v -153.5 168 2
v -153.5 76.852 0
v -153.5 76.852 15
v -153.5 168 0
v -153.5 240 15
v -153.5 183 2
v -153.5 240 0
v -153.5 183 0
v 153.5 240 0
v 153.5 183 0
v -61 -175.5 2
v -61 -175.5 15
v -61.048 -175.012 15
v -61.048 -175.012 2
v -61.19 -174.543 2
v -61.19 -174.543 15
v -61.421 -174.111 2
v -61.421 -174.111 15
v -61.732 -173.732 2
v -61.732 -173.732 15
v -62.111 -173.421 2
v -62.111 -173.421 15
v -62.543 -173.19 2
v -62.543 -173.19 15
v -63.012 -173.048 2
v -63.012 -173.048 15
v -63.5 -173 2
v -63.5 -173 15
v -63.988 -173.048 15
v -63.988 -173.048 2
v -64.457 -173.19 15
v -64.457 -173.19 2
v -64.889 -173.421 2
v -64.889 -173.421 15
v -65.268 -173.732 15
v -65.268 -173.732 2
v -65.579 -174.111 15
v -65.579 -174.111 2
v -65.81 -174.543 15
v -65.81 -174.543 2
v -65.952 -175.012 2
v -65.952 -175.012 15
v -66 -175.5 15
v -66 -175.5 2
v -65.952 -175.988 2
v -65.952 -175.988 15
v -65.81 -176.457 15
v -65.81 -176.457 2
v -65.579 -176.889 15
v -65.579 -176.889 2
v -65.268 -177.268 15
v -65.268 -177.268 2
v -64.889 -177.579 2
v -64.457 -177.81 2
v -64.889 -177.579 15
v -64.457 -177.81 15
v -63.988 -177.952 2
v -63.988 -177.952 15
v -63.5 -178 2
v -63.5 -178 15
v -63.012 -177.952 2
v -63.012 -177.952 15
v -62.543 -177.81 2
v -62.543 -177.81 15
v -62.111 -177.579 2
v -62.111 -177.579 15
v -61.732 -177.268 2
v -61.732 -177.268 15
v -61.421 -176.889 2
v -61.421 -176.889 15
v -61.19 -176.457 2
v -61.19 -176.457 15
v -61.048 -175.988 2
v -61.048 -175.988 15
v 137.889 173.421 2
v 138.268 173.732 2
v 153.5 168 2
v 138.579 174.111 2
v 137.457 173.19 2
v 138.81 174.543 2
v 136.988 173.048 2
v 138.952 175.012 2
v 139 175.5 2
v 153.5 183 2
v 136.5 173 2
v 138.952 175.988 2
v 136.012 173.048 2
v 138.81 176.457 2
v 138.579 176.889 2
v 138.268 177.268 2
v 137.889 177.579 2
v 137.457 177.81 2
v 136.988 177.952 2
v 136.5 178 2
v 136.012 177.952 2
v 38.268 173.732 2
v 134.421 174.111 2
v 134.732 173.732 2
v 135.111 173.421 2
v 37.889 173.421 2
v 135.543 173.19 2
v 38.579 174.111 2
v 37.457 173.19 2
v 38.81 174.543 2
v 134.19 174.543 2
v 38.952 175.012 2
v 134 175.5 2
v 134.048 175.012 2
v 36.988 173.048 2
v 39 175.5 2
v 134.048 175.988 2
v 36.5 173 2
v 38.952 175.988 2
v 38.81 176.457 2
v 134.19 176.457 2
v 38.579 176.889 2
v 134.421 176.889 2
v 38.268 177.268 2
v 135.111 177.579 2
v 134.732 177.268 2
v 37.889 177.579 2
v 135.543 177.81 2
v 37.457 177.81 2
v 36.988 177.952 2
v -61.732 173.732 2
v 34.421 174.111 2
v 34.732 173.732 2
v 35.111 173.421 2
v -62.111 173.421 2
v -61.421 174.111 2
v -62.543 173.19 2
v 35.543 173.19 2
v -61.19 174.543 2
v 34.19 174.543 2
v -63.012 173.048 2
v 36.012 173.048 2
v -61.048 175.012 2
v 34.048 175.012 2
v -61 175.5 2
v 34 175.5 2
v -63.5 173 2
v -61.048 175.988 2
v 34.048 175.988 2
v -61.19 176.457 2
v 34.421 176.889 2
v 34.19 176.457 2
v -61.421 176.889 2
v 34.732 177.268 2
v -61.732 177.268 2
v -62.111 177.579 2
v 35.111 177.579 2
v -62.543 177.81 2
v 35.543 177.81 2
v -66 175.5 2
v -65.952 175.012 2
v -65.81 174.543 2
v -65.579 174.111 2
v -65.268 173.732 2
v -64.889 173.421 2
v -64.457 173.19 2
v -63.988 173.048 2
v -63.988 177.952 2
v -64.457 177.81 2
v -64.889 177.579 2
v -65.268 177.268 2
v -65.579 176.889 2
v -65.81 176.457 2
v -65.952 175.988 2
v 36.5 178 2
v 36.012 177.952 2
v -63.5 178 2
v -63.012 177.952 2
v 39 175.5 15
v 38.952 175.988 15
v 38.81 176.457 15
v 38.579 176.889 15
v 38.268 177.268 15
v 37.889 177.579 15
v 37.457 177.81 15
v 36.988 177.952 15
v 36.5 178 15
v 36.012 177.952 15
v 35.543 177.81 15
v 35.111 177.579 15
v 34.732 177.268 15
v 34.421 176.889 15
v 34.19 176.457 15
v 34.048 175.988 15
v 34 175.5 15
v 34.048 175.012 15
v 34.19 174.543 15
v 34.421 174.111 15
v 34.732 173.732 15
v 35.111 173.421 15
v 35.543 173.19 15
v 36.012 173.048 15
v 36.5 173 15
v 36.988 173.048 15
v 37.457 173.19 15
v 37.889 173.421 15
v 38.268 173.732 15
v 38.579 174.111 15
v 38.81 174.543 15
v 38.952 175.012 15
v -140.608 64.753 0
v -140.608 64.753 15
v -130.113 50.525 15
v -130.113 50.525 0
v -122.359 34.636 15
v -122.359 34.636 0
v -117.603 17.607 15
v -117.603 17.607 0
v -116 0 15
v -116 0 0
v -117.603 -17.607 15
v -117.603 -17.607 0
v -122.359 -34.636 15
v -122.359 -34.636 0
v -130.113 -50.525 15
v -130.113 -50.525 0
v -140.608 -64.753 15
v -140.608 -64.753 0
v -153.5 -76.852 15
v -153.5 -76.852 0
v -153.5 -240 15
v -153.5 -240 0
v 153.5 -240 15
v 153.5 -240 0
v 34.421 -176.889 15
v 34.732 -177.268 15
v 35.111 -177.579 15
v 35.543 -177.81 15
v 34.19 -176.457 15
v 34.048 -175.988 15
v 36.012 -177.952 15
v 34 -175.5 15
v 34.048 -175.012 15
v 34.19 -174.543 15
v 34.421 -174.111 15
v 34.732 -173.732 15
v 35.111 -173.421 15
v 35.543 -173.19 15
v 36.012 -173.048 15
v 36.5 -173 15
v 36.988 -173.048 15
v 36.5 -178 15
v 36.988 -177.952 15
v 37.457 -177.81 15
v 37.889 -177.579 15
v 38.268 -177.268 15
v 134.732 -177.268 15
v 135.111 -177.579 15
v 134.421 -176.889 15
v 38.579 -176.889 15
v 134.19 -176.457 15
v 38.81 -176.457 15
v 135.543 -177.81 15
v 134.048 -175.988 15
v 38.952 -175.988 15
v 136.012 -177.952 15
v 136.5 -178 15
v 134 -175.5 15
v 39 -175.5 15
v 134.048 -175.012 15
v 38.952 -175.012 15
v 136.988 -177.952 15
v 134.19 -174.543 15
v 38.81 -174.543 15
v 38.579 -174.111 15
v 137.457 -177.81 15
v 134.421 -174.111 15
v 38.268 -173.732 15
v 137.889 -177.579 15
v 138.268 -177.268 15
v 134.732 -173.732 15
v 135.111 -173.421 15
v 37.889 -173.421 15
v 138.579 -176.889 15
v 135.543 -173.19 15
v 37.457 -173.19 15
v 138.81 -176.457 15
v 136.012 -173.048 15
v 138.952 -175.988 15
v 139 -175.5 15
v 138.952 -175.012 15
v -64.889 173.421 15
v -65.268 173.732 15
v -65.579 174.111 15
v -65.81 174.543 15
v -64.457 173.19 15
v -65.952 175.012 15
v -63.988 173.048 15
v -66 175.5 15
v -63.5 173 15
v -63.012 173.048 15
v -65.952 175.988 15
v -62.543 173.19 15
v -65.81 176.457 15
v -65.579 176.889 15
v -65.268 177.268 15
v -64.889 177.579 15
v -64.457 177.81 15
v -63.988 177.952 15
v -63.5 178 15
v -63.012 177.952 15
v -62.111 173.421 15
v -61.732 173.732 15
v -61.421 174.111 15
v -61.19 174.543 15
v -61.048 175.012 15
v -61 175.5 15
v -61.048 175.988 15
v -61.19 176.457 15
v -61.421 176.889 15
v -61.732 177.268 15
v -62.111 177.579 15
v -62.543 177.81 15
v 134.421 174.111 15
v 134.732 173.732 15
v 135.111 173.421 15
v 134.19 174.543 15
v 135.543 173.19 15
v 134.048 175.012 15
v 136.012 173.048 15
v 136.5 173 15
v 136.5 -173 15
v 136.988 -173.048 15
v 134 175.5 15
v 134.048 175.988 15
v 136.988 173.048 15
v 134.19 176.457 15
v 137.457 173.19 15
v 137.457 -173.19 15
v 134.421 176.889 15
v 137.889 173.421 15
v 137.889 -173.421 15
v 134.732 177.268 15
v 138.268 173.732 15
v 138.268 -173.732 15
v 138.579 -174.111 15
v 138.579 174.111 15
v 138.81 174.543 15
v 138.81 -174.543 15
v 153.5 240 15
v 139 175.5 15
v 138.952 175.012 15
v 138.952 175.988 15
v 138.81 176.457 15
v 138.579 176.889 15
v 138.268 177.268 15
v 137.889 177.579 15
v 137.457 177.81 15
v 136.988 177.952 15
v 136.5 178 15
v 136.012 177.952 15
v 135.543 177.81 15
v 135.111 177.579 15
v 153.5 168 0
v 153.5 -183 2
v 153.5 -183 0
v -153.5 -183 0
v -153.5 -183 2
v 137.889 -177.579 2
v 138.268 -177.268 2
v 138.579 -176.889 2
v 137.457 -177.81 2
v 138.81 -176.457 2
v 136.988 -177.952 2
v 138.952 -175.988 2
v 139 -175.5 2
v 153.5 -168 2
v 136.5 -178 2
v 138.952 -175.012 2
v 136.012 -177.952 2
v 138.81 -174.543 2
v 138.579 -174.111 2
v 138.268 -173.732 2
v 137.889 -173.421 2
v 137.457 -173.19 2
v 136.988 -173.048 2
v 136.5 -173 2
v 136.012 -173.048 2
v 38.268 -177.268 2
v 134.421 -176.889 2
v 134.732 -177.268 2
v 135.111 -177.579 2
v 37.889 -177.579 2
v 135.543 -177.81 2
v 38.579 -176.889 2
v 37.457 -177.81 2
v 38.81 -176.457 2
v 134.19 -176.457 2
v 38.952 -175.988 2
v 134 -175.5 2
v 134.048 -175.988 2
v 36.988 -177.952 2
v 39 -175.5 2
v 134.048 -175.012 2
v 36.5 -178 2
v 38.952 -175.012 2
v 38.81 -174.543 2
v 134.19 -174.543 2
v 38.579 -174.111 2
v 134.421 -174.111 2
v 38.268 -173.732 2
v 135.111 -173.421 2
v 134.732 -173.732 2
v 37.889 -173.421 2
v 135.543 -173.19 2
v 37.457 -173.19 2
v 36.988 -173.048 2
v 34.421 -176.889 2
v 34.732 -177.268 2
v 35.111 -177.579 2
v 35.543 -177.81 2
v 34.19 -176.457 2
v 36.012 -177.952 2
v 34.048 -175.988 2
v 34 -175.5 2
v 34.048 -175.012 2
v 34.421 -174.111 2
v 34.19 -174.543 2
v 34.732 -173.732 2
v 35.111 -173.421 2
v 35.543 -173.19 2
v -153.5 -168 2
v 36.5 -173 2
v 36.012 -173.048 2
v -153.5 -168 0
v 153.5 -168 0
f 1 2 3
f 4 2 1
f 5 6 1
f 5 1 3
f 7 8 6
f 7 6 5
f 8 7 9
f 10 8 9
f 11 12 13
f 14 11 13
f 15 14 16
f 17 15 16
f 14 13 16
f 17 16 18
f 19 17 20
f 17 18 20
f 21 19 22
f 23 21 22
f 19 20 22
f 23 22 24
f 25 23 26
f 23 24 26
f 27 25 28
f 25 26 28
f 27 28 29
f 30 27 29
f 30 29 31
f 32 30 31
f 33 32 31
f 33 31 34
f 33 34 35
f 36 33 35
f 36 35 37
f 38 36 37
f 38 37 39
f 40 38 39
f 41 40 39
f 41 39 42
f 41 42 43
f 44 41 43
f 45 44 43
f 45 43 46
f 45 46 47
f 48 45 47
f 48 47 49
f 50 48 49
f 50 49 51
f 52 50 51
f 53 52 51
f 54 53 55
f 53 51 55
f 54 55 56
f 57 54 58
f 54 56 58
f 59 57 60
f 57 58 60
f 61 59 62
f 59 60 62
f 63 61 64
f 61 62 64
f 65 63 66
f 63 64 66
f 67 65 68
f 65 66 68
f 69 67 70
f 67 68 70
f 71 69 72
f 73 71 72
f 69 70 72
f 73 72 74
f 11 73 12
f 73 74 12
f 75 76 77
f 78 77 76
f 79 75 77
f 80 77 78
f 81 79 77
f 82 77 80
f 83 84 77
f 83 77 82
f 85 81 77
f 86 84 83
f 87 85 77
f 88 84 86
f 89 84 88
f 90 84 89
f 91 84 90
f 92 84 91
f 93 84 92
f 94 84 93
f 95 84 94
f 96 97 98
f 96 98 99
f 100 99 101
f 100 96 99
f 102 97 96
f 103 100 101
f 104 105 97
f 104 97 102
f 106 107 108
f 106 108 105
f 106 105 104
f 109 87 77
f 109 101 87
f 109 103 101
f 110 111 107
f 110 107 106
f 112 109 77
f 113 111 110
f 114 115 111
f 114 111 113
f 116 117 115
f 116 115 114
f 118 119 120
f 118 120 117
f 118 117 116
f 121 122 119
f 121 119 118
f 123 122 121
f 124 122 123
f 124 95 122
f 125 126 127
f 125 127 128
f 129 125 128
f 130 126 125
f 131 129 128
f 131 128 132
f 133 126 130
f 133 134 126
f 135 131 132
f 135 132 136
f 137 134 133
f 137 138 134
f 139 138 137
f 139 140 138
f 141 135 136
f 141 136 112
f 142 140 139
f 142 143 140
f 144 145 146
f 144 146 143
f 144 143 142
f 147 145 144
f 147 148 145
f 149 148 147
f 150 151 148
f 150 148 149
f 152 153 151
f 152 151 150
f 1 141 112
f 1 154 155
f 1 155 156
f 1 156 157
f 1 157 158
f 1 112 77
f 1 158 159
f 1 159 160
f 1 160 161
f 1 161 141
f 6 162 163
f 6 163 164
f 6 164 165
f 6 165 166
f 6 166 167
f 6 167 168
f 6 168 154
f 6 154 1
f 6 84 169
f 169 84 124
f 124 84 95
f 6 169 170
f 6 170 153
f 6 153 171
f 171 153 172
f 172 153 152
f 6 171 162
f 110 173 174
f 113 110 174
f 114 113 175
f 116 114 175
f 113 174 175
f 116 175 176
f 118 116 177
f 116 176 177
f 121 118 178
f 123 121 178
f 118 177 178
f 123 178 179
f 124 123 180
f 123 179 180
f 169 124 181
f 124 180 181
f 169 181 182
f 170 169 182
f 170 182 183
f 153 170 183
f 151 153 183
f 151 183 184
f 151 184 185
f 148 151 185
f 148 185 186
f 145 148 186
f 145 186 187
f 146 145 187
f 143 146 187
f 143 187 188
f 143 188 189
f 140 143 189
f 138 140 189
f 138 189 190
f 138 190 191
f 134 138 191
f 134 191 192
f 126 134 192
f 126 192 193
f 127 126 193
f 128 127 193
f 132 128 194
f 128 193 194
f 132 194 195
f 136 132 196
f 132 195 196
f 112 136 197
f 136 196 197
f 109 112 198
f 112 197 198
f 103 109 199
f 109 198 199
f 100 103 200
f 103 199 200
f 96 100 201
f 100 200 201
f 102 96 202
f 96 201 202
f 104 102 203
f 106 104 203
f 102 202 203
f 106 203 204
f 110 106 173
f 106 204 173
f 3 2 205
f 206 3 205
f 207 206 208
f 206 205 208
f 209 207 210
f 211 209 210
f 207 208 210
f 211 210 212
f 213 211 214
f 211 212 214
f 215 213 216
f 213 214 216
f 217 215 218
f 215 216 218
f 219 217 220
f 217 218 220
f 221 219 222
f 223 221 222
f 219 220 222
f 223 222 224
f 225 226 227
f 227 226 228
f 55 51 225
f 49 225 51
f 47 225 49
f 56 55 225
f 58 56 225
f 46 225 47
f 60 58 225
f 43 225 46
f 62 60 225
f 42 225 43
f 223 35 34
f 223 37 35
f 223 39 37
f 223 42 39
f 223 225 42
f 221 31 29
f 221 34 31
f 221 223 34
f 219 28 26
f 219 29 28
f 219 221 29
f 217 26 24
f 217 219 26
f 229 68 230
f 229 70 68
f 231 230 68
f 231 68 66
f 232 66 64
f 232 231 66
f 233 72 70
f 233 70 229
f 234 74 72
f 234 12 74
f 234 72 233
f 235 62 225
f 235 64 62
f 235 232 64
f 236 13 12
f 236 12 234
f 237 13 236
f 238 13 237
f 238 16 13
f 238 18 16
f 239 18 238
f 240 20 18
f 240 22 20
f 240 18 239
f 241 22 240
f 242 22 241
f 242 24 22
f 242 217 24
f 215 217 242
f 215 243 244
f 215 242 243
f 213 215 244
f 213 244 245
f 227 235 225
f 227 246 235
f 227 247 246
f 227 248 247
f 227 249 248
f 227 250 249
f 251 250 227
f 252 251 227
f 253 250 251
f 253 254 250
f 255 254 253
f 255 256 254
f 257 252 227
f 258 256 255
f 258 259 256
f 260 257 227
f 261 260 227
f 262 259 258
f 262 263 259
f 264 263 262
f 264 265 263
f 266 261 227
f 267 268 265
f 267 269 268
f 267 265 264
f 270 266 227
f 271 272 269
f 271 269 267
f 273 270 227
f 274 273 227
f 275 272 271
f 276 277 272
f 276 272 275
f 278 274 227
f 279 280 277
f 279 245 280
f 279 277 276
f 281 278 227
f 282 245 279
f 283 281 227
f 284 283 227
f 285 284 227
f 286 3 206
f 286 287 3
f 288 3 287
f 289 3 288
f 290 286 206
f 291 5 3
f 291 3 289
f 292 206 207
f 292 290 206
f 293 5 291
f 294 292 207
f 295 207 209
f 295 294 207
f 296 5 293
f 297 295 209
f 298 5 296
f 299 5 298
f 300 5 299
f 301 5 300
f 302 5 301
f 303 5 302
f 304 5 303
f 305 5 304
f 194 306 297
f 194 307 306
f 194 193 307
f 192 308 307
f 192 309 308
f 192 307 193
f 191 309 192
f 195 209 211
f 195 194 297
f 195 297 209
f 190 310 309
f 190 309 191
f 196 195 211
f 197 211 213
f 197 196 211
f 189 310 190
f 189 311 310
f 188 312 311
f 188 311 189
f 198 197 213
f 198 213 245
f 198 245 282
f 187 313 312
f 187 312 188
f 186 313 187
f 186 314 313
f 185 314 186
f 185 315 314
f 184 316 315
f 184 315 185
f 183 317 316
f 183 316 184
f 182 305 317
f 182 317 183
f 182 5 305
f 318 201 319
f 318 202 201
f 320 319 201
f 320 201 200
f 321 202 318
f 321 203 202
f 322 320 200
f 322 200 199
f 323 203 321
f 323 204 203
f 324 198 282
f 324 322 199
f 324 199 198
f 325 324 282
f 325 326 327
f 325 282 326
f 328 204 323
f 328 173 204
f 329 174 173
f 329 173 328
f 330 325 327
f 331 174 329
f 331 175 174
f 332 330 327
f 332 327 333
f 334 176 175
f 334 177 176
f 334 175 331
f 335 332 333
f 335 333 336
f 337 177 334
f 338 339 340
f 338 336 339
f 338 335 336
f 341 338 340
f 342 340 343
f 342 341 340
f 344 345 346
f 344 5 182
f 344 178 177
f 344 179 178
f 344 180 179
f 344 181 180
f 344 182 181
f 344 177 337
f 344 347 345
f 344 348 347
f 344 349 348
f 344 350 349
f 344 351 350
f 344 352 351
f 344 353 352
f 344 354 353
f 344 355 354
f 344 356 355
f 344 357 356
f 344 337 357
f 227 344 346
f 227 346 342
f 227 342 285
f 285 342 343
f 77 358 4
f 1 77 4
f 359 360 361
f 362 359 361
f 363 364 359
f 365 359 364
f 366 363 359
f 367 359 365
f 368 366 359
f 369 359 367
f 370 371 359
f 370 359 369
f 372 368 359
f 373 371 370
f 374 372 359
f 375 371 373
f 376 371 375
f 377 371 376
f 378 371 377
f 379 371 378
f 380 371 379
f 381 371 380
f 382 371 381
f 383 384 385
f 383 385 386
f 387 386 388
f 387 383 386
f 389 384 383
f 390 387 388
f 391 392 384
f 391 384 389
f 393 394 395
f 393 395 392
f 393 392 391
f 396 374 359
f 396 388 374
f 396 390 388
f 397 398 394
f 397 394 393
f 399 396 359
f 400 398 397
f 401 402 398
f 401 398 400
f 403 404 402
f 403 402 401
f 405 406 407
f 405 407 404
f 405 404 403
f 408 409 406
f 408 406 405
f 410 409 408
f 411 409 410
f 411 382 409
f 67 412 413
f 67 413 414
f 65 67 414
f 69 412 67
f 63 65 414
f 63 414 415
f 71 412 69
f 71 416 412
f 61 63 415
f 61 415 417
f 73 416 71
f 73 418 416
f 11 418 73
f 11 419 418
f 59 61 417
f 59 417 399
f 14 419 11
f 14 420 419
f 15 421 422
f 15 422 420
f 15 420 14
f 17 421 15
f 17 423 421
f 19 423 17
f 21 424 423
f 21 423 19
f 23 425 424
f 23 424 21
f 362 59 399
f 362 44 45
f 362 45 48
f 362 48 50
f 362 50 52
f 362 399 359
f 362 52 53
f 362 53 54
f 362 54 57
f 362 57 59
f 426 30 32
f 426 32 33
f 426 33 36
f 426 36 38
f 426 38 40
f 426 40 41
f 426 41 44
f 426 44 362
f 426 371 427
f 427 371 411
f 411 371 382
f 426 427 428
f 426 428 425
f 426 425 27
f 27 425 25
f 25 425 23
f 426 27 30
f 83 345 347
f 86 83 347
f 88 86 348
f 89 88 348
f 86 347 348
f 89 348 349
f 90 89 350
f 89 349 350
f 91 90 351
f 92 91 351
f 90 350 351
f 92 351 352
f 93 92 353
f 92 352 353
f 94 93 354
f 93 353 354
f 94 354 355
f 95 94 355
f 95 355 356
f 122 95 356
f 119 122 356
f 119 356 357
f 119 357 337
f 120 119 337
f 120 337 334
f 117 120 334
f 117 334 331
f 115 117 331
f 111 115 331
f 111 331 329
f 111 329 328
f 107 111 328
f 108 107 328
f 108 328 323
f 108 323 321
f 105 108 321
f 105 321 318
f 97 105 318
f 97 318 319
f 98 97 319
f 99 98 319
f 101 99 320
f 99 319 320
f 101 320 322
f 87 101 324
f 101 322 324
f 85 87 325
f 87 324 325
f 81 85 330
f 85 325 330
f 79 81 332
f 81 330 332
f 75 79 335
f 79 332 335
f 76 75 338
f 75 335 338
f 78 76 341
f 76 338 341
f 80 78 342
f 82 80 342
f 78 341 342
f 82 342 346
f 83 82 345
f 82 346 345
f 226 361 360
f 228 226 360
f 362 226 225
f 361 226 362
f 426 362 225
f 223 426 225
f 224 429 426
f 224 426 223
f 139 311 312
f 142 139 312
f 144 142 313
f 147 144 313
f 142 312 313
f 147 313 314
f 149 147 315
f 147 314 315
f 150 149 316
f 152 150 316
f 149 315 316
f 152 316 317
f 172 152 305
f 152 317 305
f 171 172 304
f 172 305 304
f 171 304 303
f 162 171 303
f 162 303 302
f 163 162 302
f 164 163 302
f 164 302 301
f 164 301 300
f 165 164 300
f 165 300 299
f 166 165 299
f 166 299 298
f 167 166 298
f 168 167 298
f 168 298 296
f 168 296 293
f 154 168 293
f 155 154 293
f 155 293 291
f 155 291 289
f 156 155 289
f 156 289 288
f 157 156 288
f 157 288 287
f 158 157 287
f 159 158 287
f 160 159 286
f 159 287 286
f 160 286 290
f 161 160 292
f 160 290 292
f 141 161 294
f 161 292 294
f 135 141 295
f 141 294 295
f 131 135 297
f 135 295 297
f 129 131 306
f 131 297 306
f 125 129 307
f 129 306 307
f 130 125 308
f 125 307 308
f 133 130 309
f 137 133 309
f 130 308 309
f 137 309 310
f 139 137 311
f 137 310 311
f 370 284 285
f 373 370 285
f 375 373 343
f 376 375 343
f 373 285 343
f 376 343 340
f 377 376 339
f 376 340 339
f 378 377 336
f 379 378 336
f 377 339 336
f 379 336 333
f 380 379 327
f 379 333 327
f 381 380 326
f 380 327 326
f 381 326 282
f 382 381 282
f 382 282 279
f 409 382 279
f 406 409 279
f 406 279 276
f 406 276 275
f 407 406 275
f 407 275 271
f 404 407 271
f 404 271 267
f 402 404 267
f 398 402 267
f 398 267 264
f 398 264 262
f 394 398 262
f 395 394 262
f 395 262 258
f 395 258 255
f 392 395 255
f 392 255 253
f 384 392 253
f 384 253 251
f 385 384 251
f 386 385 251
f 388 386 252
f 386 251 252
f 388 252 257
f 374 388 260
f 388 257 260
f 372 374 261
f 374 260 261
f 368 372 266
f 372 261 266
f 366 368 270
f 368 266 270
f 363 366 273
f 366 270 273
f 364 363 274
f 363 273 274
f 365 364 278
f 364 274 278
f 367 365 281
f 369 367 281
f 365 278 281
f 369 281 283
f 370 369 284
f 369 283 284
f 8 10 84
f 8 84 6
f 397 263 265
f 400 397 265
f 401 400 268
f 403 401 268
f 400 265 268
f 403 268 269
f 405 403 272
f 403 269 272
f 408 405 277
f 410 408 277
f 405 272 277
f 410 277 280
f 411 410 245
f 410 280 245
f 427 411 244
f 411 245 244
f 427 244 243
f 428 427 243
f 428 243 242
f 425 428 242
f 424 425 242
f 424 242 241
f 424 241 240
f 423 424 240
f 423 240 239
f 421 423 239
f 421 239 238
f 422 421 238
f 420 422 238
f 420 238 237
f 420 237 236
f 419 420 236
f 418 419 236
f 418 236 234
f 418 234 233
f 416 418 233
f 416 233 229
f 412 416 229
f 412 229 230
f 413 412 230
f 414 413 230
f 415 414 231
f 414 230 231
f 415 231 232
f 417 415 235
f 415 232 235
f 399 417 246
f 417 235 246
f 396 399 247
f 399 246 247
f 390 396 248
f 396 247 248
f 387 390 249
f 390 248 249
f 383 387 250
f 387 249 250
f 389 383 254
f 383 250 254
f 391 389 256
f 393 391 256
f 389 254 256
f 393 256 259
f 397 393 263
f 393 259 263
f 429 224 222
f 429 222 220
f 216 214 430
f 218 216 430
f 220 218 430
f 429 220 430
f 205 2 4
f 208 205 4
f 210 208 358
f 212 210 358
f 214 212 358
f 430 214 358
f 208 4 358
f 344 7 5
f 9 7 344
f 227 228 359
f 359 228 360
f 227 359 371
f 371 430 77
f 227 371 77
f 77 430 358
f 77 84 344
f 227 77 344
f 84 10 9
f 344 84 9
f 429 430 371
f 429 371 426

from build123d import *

# Parameters (mm, degrees)
SKETCH_1_W          = 307
SKETCH_1_H          = 480
EXTRUDE_1_DEPTH     = 15
SKETCH_2_W          = 307
SKETCH_2_H          = 15
CUT_EXTRUDE_1_DEPTH = 2
CUT_EXTRUDE_2_DEPTH = 286.284507115
HOLE_WIZARD_M6_1_D  = 5


with BuildPart() as part:
    # 草图1 → 凸台-拉伸1 (new body)
    with BuildSketch(Plane.XY):
        Rectangle(SKETCH_1_W, SKETCH_1_H)
    extrude(amount=EXTRUDE_1_DEPTH)

    # 草图2 → 切除-拉伸1 (cut)
    with BuildSketch(Plane(origin=(0, 0, 0), x_dir=(-1, 0, 0), z_dir=(0, 0, -1))):
        with Locations((0, 175.5)):
            Rectangle(SKETCH_2_W, SKETCH_2_H)
        with Locations((0, -175.5)):
            Rectangle(SKETCH_2_W, SKETCH_2_H)
    extrude(amount=-CUT_EXTRUDE_1_DEPTH, mode=Mode.SUBTRACT)

    # 草图3 → 切除-拉伸2 (cut, through all)
    with BuildSketch(Plane(origin=(0, 0, 0), x_dir=(-1, 0, 0), z_dir=(0, 0, -1))):
        with BuildLine():
            ThreePointArc((153.5, -76.852130745), (256.256578441, -87.624910842), (311, 0))
            ThreePointArc((311, 0), (256.256578441, 87.624910842), (153.5, 76.852130745))
            Line((153.5, 76.852130745), (153.5, -76.852130745))
        make_face()
        with BuildLine():
            Line((153.5, -76.852130745), (153.5, 76.852130745))
            ThreePointArc((153.5, 76.852130745), (116, 0), (153.5, -76.852130745))
        make_face()
    extrude(amount=-CUT_EXTRUDE_2_DEPTH, mode=Mode.SUBTRACT)

    # M6 螺纹孔1 (through all)
    with Locations(Plane(origin=(0, 0, 2), x_dir=(-1, 0, 0), z_dir=(0, 0, -1))):
        with Locations((63.5, -175.5), (-36.5, -175.5), (-136.5, -175.5), (-136.5, 175.5), (-36.5, 175.5), (63.5, 175.5)):
            Hole(HOLE_WIZARD_M6_1_D / 2)


solid = part.part
